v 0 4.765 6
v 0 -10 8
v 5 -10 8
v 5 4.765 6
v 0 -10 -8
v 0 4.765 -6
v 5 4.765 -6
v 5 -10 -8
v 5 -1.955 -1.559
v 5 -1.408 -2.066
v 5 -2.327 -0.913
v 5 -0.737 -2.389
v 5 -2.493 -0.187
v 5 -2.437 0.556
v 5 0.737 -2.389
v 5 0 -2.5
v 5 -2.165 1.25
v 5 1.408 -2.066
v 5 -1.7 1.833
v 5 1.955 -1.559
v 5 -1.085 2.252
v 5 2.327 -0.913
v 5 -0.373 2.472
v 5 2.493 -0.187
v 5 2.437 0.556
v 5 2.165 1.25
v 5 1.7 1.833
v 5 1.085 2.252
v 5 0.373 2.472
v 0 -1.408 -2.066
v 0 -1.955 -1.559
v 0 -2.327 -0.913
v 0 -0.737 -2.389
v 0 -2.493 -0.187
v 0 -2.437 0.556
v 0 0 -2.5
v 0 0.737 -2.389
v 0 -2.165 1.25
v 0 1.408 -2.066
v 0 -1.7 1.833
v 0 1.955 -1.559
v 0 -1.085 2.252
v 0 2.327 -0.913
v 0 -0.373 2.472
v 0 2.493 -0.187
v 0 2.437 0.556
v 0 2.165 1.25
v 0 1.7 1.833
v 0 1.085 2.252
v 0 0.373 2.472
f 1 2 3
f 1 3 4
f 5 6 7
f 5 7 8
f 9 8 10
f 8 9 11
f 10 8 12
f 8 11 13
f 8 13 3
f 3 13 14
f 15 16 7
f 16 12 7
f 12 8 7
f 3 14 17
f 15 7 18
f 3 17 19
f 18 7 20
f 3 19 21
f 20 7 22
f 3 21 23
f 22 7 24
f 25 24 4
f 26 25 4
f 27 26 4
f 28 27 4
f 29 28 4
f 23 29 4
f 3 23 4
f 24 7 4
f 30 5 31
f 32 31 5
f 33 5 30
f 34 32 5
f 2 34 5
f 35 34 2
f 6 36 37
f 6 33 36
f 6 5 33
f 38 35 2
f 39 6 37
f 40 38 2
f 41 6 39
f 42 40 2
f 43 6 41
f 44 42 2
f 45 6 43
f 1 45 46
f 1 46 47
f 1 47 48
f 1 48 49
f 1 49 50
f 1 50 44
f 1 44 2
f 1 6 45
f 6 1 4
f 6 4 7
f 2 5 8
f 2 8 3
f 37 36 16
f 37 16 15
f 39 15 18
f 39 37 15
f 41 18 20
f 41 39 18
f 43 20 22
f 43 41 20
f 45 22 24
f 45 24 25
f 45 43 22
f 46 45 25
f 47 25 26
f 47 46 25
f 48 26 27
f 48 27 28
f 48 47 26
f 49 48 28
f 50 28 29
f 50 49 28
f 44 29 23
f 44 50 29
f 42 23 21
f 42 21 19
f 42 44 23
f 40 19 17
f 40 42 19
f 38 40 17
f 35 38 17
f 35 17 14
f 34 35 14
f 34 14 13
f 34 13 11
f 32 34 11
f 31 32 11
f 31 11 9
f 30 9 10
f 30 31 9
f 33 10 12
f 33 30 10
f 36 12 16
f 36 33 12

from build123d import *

# Parameters (mm, degrees)
SKETCH1_R           = 2.5
BOSS_EXTRUDE1_DEPTH = 5


with BuildPart() as part:
    # Sketch1 → Boss-Extrude1 (new body)
    with BuildSketch(Plane(origin=(0, 0, 0), x_dir=(0, 0, -1), z_dir=(1, 0, 0))):
        Polygon((8, -10), (-8, -10), (-6, 4.765251939), (6, 4.765251939), align=None)
        Circle(SKETCH1_R, mode=Mode.SUBTRACT)
    extrude(amount=BOSS_EXTRUDE1_DEPTH)


solid = part.part
